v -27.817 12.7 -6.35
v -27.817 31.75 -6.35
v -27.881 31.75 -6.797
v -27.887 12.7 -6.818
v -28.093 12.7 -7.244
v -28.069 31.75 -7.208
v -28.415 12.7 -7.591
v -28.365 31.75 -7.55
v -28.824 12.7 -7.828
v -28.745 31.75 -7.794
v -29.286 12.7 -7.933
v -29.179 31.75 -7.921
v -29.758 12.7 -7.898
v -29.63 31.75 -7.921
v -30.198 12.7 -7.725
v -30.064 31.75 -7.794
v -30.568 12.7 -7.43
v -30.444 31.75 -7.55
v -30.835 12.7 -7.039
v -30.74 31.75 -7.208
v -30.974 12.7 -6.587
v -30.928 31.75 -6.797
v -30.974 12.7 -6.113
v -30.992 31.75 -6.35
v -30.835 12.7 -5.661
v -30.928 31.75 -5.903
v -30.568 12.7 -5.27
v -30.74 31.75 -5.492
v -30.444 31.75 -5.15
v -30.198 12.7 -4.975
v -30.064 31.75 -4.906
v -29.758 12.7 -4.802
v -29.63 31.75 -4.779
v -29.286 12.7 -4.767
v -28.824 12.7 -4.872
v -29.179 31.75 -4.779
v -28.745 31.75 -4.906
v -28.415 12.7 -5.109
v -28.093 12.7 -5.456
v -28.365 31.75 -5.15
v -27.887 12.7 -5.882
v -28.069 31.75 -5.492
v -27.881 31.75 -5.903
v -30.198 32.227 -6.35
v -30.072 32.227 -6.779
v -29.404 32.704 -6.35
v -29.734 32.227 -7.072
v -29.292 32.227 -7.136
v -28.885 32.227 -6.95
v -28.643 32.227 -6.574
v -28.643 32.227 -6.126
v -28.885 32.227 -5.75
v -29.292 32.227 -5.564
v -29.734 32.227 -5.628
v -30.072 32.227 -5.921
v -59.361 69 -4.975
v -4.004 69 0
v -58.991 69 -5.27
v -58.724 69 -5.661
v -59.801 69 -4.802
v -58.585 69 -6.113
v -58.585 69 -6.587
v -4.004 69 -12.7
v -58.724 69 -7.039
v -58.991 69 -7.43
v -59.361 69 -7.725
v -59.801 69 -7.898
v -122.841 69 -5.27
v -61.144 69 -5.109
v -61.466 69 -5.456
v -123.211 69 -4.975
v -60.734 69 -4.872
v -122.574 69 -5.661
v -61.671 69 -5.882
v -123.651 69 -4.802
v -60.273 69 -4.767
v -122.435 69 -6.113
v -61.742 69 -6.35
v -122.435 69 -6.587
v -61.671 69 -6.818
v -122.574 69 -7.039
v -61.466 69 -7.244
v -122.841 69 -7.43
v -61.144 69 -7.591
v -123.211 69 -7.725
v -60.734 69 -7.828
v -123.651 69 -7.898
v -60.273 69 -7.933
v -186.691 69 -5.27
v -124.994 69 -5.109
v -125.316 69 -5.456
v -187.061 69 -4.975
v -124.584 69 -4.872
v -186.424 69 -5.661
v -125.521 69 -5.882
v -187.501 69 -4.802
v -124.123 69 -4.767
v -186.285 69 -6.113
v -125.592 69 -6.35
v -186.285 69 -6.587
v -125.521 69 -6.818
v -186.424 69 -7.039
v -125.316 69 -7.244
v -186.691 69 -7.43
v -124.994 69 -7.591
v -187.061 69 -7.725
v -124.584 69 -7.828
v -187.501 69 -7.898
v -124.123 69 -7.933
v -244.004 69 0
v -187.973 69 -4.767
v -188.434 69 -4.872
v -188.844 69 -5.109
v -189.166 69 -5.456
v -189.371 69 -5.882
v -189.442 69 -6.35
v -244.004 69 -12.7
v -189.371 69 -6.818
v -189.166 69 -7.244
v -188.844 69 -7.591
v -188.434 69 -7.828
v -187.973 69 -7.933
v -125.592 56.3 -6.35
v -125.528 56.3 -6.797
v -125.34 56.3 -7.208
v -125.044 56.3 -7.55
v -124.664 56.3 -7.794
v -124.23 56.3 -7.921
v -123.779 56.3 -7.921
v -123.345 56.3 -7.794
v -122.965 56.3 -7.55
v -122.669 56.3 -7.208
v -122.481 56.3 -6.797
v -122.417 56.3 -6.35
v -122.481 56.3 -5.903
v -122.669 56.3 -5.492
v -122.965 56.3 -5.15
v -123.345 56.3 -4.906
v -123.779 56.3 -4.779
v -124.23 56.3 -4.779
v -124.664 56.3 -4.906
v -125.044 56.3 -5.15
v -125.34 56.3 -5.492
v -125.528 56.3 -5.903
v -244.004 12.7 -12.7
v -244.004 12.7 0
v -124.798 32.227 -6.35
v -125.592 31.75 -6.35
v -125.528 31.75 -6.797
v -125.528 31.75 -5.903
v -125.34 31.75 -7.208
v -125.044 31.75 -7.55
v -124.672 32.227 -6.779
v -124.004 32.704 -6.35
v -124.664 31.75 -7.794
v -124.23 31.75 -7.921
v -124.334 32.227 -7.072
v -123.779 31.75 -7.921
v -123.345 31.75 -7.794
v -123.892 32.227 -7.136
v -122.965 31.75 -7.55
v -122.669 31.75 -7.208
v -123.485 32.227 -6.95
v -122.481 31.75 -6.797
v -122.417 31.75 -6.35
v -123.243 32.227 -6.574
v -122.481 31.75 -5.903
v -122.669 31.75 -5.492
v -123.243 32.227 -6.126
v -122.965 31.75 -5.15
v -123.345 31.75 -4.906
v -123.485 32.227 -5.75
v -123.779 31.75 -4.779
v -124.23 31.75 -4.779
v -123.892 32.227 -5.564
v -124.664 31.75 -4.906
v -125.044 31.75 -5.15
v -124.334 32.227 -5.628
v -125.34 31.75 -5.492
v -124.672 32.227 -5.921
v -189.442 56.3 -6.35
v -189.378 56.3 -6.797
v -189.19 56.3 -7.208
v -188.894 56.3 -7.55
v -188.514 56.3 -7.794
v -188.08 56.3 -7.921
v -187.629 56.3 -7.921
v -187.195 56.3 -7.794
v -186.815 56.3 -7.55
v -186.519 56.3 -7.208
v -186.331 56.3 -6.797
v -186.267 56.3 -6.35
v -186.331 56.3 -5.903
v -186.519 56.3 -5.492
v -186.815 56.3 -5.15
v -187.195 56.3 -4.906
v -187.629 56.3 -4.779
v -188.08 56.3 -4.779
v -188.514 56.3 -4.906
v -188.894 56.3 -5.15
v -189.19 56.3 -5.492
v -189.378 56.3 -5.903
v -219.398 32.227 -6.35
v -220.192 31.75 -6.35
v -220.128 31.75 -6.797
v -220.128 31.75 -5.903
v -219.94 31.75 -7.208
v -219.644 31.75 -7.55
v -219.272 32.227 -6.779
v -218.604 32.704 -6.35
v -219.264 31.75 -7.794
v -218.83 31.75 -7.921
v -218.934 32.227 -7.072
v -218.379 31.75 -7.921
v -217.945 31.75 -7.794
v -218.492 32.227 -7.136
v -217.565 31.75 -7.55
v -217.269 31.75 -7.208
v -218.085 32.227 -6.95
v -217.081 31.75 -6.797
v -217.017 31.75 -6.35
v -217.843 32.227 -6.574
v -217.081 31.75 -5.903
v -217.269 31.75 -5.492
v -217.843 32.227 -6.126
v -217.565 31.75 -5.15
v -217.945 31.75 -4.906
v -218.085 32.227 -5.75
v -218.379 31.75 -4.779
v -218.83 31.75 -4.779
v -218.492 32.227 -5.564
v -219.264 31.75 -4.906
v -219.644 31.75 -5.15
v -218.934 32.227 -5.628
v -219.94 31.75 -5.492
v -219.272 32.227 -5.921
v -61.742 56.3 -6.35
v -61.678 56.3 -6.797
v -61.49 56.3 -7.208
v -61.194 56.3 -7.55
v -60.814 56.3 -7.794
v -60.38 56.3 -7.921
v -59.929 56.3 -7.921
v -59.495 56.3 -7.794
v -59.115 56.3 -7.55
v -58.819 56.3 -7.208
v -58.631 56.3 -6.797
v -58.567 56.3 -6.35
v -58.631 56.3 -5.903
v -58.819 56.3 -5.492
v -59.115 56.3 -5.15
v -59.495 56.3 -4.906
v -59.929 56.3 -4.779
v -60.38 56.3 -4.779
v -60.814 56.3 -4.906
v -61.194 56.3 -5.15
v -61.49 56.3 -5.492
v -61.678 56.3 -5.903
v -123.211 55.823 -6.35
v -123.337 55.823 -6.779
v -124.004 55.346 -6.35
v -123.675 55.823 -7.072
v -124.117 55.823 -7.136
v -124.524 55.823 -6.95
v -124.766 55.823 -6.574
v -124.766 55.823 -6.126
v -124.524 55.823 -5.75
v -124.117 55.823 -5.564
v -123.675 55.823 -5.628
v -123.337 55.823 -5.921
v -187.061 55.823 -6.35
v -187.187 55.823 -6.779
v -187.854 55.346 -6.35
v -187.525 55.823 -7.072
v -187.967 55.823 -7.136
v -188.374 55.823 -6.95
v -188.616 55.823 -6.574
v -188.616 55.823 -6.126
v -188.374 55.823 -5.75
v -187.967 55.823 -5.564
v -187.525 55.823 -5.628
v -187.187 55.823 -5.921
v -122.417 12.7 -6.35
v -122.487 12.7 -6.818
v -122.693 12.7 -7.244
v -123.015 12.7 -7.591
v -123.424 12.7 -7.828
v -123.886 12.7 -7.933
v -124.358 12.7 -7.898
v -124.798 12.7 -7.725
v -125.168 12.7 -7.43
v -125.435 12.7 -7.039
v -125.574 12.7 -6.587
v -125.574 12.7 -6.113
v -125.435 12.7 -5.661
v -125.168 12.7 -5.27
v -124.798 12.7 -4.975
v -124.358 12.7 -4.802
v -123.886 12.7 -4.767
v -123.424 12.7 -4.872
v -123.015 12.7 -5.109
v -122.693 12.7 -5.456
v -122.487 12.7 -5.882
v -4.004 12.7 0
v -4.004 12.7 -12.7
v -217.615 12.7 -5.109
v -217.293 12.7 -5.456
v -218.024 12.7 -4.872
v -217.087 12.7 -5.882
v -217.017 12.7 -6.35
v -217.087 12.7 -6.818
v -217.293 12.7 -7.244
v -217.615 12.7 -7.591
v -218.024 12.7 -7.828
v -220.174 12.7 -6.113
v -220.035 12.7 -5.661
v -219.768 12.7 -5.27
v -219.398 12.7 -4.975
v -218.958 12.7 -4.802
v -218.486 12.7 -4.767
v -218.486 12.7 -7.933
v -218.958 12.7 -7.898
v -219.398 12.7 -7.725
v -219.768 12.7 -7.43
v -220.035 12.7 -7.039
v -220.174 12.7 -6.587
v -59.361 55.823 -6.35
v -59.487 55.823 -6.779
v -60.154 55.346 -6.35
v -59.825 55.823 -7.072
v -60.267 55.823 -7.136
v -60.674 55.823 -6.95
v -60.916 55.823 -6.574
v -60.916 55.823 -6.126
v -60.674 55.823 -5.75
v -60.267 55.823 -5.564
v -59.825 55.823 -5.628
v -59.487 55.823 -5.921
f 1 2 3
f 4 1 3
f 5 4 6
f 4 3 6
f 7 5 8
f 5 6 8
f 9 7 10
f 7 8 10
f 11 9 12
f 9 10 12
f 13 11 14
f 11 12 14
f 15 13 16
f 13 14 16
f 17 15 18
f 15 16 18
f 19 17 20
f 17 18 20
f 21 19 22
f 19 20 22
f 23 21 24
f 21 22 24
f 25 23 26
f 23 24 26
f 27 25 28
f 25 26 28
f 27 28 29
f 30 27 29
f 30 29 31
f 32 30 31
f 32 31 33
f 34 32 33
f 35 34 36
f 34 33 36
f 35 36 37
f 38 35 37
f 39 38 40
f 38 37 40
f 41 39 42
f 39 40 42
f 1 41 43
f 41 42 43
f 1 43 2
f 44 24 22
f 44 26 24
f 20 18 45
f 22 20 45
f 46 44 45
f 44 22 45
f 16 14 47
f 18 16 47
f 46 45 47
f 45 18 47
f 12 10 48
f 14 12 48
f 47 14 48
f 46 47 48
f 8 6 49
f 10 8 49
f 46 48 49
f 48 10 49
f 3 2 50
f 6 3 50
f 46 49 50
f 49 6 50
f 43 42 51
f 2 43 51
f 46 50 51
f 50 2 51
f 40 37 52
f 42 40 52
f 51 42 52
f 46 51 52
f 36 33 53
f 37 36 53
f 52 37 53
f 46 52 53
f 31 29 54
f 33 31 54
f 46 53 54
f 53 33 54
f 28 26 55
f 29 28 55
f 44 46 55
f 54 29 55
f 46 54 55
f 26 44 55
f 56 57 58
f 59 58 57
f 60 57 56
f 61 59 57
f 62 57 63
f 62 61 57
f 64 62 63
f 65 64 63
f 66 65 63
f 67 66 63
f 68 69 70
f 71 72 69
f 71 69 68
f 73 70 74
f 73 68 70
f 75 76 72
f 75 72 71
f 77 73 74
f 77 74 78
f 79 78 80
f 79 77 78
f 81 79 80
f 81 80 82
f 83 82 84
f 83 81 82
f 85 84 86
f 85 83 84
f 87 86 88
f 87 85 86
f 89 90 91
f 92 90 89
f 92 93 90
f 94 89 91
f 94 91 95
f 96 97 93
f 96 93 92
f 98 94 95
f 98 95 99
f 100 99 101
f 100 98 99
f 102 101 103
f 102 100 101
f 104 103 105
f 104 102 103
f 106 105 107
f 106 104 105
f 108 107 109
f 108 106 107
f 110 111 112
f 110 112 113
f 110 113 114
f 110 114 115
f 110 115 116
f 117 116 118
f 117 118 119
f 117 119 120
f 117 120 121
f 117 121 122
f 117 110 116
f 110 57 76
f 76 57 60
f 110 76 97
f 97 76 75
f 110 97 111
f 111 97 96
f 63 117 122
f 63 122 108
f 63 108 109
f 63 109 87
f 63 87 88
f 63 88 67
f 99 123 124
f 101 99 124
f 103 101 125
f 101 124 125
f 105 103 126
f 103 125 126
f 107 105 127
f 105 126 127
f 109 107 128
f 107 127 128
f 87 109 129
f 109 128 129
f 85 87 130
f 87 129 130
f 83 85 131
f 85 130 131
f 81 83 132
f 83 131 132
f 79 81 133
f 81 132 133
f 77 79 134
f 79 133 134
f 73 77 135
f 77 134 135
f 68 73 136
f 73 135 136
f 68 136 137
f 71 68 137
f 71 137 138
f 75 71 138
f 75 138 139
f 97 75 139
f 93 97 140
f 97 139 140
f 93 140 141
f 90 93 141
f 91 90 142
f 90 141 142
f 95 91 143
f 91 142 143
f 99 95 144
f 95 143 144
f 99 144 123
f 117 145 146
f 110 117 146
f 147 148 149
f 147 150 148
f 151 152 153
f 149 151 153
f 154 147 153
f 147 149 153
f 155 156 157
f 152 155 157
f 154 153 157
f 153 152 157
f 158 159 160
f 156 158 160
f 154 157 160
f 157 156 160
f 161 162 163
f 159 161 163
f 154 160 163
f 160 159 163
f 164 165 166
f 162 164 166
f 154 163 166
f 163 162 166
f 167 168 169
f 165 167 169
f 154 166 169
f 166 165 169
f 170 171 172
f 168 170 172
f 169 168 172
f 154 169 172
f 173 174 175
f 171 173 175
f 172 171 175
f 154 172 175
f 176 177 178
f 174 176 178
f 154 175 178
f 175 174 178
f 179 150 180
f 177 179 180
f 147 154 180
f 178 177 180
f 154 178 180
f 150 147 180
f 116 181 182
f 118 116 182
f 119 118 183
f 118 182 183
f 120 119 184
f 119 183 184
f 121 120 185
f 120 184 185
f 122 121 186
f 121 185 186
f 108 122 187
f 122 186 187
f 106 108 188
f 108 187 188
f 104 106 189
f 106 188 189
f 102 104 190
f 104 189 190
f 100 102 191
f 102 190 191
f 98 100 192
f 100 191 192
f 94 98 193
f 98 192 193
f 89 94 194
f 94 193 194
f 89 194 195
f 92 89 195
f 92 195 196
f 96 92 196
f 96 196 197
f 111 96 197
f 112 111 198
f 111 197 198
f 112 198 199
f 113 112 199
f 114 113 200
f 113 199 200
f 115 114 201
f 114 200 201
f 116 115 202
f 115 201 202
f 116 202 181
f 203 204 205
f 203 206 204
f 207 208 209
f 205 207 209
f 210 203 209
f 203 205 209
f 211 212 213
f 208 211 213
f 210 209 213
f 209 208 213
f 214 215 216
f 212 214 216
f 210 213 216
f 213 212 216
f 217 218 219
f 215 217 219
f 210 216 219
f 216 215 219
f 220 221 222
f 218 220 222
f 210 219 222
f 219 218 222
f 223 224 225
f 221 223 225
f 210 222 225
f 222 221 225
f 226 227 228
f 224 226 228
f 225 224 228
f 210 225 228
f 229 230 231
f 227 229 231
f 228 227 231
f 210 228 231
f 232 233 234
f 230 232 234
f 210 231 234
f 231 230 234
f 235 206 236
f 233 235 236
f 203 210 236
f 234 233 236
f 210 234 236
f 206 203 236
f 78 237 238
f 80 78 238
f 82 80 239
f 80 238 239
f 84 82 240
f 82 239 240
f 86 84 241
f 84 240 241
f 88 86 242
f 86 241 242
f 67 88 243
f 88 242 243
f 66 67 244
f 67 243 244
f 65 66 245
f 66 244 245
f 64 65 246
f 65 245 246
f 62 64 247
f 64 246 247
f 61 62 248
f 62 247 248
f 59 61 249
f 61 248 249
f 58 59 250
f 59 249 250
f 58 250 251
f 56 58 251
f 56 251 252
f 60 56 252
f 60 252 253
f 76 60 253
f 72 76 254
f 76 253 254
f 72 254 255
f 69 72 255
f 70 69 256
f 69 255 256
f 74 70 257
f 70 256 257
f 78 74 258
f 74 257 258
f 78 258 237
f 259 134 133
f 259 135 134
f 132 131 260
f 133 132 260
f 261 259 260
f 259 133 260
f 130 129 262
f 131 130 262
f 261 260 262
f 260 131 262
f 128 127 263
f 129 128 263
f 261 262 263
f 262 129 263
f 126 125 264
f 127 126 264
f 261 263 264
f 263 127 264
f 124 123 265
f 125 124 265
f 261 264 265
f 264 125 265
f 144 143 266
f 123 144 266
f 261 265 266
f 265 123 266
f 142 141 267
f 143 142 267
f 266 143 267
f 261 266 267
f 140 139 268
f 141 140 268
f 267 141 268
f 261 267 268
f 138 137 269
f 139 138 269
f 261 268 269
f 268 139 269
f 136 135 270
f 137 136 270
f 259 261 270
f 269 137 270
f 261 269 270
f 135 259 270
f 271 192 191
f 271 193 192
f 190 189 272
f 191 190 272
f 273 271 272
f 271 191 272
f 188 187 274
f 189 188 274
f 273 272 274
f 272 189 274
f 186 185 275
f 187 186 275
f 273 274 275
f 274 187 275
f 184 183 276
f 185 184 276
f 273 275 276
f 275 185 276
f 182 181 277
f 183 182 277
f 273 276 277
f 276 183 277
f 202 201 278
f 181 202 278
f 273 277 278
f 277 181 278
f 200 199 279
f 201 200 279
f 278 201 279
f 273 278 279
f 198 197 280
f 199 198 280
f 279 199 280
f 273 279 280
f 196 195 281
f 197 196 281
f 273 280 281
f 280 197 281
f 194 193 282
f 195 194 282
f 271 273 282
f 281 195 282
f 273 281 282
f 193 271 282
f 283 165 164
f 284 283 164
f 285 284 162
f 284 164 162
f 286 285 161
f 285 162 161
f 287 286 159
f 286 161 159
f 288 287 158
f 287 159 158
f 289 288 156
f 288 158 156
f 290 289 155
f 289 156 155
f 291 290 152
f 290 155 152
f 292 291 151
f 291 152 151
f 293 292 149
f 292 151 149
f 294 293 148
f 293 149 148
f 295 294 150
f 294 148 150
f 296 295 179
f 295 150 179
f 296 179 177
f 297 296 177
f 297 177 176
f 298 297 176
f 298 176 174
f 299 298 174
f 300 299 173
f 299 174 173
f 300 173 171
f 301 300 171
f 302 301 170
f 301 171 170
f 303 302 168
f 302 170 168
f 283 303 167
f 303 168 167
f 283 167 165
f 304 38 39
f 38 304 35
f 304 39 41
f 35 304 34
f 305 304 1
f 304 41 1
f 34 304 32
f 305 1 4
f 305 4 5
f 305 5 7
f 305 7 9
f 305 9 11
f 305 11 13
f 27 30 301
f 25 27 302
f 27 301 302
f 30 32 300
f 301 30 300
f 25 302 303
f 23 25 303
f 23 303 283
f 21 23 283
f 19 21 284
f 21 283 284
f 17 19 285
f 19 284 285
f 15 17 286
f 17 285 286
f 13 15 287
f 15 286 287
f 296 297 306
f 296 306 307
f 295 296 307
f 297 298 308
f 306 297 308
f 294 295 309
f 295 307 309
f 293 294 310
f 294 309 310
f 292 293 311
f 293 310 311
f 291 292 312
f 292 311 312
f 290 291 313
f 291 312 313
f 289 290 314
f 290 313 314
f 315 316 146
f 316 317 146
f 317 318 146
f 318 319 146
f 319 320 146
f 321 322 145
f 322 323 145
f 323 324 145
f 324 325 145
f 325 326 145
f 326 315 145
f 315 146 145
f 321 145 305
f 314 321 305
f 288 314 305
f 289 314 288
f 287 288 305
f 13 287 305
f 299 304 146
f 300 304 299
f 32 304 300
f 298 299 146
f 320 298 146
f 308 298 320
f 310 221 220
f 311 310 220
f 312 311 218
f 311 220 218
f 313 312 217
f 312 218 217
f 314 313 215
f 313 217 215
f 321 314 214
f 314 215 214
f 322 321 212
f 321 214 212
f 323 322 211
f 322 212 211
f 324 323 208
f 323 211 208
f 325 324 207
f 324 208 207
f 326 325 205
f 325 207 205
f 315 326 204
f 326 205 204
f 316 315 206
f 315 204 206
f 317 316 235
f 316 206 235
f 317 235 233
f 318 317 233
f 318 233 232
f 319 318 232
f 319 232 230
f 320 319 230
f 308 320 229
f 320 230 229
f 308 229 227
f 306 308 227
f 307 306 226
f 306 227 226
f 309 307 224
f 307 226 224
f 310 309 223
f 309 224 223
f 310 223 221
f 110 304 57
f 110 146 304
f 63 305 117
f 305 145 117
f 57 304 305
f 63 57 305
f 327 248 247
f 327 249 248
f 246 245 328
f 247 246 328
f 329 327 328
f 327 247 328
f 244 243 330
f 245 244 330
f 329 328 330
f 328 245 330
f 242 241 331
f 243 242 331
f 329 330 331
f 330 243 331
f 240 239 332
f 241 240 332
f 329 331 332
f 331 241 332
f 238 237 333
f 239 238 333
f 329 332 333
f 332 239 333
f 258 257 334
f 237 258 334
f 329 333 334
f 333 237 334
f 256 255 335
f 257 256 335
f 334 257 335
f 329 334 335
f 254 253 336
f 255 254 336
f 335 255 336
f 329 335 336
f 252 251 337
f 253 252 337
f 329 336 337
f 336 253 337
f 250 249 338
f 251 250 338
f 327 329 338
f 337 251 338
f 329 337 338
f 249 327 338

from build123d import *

# Parameters (mm, degrees)
SKETCH1_W           = 214.599999988
SKETCH1_H           = 56.3
BOSS_EXTRUDE1_DEPTH = 12.7
SKETCH3_W           = 12.7
SKETCH3_H           = 56.3
BOSS_EXTRUDE2_DEPTH = 12.7
SKETCH4_W           = 12.7
SKETCH4_H           = 56.3
BOSS_EXTRUDE3_DEPTH = 12.7
HOLE1_D             = 3.175
HOLE1_DEPTH         = 31.75
HOLE1_CSINK_D       = 10.16
HOLE1_CSINK_ANGLE   = 82
HOLE1_TIP           = 0.953866233
HOLE2_D             = 3.175
HOLE2_DEPTH         = 31.75
HOLE2_CSINK_D       = 10.16
HOLE2_CSINK_ANGLE   = 82
HOLE2_TIP           = 0.953866233


with BuildPart() as part:
    # Sketch1 → Boss-Extrude1 (new body)
    with BuildSketch(Plane.XY):
        with Locations((-124.004465969, 40.85)):
            Rectangle(SKETCH1_W, SKETCH1_H)
    extrude(amount=-BOSS_EXTRUDE1_DEPTH)

    # Sketch3 → Boss-Extrude2 (add)
    with BuildSketch(Plane.ZY.offset(231.304465963)):
        with Locations((-6.35, 40.85)):
            Rectangle(SKETCH3_W, SKETCH3_H)
    extrude(amount=BOSS_EXTRUDE2_DEPTH)

    # Sketch4 → Boss-Extrude3 (add)
    with BuildSketch(Plane(origin=(-16.704465975, 0, 0), x_dir=(0, 0, -1), z_dir=(1, 0, 0))):
        with Locations((6.35, 40.85)):
            Rectangle(SKETCH4_W, SKETCH4_H)
    extrude(amount=BOSS_EXTRUDE3_DEPTH)

    # Hole1
    with Locations(Plane(origin=(-124.004465969, 0, 155.024290059), x_dir=(-1, 0, 0), z_dir=(0, -1, 0))):
        with Locations((113.649999994, 128.807623392), (113.649999994, 23.940956725), (-94.599999994, 161.374290059), (94.599999994, 161.374290059), (0, 161.374290059), (0, 193.124290059), (0, 440.553783621), (0, 301.970350905), (40.979166666, 301.970350905), (166.795833328, 301.970350905), (207.774999994, 440.553783621), (207.774999994, 333.02141023), (207.774999994, 225.48903684), (207.774999994, 137.424290059), (207.774999994, 10.424290059), (-207.774999994, 10.424290059), (-207.774999994, 137.424290059), (-207.774999994, 225.48903684), (-207.774999994, 333.02141023), (-207.774999994, 440.553783621), (-166.795833328, 301.970350905), (-40.979166666, 301.970350905), (-113.649999994, 23.940956725), (-113.649999994, 128.807623392)):
            CounterSinkHole(HOLE1_D / 2, HOLE1_CSINK_D / 2, depth=HOLE1_DEPTH, counter_sink_angle=HOLE1_CSINK_ANGLE)
            with Locations((0, 0, -(HOLE1_DEPTH + HOLE1_TIP / 2))):  # 118° drill point
                Cone(0, HOLE1_D / 2, HOLE1_TIP, mode=Mode.SUBTRACT)

    # Hole2
    with Locations(Plane(origin=(-124.004465969, 88.05, 155.024290059), x_dir=(1, 0, 0), z_dir=(0, 1, 0))):
        with Locations((-162.299999994, -8.625709941), (-113.649999994, 50.157623392), (-113.649999994, 102.590956725), (162.299999994, -8.625709941), (113.649999994, 50.157623392), (113.649999994, 102.590956725), (63.85, 161.374290059), (0, 161.374290059), (-63.85, 161.374290059)):
            CounterSinkHole(HOLE2_D / 2, HOLE2_CSINK_D / 2, depth=HOLE2_DEPTH, counter_sink_angle=HOLE2_CSINK_ANGLE)
            with Locations((0, 0, -(HOLE2_DEPTH + HOLE2_TIP / 2))):  # 118° drill point
                Cone(0, HOLE2_D / 2, HOLE2_TIP, mode=Mode.SUBTRACT)


solid = part.part
